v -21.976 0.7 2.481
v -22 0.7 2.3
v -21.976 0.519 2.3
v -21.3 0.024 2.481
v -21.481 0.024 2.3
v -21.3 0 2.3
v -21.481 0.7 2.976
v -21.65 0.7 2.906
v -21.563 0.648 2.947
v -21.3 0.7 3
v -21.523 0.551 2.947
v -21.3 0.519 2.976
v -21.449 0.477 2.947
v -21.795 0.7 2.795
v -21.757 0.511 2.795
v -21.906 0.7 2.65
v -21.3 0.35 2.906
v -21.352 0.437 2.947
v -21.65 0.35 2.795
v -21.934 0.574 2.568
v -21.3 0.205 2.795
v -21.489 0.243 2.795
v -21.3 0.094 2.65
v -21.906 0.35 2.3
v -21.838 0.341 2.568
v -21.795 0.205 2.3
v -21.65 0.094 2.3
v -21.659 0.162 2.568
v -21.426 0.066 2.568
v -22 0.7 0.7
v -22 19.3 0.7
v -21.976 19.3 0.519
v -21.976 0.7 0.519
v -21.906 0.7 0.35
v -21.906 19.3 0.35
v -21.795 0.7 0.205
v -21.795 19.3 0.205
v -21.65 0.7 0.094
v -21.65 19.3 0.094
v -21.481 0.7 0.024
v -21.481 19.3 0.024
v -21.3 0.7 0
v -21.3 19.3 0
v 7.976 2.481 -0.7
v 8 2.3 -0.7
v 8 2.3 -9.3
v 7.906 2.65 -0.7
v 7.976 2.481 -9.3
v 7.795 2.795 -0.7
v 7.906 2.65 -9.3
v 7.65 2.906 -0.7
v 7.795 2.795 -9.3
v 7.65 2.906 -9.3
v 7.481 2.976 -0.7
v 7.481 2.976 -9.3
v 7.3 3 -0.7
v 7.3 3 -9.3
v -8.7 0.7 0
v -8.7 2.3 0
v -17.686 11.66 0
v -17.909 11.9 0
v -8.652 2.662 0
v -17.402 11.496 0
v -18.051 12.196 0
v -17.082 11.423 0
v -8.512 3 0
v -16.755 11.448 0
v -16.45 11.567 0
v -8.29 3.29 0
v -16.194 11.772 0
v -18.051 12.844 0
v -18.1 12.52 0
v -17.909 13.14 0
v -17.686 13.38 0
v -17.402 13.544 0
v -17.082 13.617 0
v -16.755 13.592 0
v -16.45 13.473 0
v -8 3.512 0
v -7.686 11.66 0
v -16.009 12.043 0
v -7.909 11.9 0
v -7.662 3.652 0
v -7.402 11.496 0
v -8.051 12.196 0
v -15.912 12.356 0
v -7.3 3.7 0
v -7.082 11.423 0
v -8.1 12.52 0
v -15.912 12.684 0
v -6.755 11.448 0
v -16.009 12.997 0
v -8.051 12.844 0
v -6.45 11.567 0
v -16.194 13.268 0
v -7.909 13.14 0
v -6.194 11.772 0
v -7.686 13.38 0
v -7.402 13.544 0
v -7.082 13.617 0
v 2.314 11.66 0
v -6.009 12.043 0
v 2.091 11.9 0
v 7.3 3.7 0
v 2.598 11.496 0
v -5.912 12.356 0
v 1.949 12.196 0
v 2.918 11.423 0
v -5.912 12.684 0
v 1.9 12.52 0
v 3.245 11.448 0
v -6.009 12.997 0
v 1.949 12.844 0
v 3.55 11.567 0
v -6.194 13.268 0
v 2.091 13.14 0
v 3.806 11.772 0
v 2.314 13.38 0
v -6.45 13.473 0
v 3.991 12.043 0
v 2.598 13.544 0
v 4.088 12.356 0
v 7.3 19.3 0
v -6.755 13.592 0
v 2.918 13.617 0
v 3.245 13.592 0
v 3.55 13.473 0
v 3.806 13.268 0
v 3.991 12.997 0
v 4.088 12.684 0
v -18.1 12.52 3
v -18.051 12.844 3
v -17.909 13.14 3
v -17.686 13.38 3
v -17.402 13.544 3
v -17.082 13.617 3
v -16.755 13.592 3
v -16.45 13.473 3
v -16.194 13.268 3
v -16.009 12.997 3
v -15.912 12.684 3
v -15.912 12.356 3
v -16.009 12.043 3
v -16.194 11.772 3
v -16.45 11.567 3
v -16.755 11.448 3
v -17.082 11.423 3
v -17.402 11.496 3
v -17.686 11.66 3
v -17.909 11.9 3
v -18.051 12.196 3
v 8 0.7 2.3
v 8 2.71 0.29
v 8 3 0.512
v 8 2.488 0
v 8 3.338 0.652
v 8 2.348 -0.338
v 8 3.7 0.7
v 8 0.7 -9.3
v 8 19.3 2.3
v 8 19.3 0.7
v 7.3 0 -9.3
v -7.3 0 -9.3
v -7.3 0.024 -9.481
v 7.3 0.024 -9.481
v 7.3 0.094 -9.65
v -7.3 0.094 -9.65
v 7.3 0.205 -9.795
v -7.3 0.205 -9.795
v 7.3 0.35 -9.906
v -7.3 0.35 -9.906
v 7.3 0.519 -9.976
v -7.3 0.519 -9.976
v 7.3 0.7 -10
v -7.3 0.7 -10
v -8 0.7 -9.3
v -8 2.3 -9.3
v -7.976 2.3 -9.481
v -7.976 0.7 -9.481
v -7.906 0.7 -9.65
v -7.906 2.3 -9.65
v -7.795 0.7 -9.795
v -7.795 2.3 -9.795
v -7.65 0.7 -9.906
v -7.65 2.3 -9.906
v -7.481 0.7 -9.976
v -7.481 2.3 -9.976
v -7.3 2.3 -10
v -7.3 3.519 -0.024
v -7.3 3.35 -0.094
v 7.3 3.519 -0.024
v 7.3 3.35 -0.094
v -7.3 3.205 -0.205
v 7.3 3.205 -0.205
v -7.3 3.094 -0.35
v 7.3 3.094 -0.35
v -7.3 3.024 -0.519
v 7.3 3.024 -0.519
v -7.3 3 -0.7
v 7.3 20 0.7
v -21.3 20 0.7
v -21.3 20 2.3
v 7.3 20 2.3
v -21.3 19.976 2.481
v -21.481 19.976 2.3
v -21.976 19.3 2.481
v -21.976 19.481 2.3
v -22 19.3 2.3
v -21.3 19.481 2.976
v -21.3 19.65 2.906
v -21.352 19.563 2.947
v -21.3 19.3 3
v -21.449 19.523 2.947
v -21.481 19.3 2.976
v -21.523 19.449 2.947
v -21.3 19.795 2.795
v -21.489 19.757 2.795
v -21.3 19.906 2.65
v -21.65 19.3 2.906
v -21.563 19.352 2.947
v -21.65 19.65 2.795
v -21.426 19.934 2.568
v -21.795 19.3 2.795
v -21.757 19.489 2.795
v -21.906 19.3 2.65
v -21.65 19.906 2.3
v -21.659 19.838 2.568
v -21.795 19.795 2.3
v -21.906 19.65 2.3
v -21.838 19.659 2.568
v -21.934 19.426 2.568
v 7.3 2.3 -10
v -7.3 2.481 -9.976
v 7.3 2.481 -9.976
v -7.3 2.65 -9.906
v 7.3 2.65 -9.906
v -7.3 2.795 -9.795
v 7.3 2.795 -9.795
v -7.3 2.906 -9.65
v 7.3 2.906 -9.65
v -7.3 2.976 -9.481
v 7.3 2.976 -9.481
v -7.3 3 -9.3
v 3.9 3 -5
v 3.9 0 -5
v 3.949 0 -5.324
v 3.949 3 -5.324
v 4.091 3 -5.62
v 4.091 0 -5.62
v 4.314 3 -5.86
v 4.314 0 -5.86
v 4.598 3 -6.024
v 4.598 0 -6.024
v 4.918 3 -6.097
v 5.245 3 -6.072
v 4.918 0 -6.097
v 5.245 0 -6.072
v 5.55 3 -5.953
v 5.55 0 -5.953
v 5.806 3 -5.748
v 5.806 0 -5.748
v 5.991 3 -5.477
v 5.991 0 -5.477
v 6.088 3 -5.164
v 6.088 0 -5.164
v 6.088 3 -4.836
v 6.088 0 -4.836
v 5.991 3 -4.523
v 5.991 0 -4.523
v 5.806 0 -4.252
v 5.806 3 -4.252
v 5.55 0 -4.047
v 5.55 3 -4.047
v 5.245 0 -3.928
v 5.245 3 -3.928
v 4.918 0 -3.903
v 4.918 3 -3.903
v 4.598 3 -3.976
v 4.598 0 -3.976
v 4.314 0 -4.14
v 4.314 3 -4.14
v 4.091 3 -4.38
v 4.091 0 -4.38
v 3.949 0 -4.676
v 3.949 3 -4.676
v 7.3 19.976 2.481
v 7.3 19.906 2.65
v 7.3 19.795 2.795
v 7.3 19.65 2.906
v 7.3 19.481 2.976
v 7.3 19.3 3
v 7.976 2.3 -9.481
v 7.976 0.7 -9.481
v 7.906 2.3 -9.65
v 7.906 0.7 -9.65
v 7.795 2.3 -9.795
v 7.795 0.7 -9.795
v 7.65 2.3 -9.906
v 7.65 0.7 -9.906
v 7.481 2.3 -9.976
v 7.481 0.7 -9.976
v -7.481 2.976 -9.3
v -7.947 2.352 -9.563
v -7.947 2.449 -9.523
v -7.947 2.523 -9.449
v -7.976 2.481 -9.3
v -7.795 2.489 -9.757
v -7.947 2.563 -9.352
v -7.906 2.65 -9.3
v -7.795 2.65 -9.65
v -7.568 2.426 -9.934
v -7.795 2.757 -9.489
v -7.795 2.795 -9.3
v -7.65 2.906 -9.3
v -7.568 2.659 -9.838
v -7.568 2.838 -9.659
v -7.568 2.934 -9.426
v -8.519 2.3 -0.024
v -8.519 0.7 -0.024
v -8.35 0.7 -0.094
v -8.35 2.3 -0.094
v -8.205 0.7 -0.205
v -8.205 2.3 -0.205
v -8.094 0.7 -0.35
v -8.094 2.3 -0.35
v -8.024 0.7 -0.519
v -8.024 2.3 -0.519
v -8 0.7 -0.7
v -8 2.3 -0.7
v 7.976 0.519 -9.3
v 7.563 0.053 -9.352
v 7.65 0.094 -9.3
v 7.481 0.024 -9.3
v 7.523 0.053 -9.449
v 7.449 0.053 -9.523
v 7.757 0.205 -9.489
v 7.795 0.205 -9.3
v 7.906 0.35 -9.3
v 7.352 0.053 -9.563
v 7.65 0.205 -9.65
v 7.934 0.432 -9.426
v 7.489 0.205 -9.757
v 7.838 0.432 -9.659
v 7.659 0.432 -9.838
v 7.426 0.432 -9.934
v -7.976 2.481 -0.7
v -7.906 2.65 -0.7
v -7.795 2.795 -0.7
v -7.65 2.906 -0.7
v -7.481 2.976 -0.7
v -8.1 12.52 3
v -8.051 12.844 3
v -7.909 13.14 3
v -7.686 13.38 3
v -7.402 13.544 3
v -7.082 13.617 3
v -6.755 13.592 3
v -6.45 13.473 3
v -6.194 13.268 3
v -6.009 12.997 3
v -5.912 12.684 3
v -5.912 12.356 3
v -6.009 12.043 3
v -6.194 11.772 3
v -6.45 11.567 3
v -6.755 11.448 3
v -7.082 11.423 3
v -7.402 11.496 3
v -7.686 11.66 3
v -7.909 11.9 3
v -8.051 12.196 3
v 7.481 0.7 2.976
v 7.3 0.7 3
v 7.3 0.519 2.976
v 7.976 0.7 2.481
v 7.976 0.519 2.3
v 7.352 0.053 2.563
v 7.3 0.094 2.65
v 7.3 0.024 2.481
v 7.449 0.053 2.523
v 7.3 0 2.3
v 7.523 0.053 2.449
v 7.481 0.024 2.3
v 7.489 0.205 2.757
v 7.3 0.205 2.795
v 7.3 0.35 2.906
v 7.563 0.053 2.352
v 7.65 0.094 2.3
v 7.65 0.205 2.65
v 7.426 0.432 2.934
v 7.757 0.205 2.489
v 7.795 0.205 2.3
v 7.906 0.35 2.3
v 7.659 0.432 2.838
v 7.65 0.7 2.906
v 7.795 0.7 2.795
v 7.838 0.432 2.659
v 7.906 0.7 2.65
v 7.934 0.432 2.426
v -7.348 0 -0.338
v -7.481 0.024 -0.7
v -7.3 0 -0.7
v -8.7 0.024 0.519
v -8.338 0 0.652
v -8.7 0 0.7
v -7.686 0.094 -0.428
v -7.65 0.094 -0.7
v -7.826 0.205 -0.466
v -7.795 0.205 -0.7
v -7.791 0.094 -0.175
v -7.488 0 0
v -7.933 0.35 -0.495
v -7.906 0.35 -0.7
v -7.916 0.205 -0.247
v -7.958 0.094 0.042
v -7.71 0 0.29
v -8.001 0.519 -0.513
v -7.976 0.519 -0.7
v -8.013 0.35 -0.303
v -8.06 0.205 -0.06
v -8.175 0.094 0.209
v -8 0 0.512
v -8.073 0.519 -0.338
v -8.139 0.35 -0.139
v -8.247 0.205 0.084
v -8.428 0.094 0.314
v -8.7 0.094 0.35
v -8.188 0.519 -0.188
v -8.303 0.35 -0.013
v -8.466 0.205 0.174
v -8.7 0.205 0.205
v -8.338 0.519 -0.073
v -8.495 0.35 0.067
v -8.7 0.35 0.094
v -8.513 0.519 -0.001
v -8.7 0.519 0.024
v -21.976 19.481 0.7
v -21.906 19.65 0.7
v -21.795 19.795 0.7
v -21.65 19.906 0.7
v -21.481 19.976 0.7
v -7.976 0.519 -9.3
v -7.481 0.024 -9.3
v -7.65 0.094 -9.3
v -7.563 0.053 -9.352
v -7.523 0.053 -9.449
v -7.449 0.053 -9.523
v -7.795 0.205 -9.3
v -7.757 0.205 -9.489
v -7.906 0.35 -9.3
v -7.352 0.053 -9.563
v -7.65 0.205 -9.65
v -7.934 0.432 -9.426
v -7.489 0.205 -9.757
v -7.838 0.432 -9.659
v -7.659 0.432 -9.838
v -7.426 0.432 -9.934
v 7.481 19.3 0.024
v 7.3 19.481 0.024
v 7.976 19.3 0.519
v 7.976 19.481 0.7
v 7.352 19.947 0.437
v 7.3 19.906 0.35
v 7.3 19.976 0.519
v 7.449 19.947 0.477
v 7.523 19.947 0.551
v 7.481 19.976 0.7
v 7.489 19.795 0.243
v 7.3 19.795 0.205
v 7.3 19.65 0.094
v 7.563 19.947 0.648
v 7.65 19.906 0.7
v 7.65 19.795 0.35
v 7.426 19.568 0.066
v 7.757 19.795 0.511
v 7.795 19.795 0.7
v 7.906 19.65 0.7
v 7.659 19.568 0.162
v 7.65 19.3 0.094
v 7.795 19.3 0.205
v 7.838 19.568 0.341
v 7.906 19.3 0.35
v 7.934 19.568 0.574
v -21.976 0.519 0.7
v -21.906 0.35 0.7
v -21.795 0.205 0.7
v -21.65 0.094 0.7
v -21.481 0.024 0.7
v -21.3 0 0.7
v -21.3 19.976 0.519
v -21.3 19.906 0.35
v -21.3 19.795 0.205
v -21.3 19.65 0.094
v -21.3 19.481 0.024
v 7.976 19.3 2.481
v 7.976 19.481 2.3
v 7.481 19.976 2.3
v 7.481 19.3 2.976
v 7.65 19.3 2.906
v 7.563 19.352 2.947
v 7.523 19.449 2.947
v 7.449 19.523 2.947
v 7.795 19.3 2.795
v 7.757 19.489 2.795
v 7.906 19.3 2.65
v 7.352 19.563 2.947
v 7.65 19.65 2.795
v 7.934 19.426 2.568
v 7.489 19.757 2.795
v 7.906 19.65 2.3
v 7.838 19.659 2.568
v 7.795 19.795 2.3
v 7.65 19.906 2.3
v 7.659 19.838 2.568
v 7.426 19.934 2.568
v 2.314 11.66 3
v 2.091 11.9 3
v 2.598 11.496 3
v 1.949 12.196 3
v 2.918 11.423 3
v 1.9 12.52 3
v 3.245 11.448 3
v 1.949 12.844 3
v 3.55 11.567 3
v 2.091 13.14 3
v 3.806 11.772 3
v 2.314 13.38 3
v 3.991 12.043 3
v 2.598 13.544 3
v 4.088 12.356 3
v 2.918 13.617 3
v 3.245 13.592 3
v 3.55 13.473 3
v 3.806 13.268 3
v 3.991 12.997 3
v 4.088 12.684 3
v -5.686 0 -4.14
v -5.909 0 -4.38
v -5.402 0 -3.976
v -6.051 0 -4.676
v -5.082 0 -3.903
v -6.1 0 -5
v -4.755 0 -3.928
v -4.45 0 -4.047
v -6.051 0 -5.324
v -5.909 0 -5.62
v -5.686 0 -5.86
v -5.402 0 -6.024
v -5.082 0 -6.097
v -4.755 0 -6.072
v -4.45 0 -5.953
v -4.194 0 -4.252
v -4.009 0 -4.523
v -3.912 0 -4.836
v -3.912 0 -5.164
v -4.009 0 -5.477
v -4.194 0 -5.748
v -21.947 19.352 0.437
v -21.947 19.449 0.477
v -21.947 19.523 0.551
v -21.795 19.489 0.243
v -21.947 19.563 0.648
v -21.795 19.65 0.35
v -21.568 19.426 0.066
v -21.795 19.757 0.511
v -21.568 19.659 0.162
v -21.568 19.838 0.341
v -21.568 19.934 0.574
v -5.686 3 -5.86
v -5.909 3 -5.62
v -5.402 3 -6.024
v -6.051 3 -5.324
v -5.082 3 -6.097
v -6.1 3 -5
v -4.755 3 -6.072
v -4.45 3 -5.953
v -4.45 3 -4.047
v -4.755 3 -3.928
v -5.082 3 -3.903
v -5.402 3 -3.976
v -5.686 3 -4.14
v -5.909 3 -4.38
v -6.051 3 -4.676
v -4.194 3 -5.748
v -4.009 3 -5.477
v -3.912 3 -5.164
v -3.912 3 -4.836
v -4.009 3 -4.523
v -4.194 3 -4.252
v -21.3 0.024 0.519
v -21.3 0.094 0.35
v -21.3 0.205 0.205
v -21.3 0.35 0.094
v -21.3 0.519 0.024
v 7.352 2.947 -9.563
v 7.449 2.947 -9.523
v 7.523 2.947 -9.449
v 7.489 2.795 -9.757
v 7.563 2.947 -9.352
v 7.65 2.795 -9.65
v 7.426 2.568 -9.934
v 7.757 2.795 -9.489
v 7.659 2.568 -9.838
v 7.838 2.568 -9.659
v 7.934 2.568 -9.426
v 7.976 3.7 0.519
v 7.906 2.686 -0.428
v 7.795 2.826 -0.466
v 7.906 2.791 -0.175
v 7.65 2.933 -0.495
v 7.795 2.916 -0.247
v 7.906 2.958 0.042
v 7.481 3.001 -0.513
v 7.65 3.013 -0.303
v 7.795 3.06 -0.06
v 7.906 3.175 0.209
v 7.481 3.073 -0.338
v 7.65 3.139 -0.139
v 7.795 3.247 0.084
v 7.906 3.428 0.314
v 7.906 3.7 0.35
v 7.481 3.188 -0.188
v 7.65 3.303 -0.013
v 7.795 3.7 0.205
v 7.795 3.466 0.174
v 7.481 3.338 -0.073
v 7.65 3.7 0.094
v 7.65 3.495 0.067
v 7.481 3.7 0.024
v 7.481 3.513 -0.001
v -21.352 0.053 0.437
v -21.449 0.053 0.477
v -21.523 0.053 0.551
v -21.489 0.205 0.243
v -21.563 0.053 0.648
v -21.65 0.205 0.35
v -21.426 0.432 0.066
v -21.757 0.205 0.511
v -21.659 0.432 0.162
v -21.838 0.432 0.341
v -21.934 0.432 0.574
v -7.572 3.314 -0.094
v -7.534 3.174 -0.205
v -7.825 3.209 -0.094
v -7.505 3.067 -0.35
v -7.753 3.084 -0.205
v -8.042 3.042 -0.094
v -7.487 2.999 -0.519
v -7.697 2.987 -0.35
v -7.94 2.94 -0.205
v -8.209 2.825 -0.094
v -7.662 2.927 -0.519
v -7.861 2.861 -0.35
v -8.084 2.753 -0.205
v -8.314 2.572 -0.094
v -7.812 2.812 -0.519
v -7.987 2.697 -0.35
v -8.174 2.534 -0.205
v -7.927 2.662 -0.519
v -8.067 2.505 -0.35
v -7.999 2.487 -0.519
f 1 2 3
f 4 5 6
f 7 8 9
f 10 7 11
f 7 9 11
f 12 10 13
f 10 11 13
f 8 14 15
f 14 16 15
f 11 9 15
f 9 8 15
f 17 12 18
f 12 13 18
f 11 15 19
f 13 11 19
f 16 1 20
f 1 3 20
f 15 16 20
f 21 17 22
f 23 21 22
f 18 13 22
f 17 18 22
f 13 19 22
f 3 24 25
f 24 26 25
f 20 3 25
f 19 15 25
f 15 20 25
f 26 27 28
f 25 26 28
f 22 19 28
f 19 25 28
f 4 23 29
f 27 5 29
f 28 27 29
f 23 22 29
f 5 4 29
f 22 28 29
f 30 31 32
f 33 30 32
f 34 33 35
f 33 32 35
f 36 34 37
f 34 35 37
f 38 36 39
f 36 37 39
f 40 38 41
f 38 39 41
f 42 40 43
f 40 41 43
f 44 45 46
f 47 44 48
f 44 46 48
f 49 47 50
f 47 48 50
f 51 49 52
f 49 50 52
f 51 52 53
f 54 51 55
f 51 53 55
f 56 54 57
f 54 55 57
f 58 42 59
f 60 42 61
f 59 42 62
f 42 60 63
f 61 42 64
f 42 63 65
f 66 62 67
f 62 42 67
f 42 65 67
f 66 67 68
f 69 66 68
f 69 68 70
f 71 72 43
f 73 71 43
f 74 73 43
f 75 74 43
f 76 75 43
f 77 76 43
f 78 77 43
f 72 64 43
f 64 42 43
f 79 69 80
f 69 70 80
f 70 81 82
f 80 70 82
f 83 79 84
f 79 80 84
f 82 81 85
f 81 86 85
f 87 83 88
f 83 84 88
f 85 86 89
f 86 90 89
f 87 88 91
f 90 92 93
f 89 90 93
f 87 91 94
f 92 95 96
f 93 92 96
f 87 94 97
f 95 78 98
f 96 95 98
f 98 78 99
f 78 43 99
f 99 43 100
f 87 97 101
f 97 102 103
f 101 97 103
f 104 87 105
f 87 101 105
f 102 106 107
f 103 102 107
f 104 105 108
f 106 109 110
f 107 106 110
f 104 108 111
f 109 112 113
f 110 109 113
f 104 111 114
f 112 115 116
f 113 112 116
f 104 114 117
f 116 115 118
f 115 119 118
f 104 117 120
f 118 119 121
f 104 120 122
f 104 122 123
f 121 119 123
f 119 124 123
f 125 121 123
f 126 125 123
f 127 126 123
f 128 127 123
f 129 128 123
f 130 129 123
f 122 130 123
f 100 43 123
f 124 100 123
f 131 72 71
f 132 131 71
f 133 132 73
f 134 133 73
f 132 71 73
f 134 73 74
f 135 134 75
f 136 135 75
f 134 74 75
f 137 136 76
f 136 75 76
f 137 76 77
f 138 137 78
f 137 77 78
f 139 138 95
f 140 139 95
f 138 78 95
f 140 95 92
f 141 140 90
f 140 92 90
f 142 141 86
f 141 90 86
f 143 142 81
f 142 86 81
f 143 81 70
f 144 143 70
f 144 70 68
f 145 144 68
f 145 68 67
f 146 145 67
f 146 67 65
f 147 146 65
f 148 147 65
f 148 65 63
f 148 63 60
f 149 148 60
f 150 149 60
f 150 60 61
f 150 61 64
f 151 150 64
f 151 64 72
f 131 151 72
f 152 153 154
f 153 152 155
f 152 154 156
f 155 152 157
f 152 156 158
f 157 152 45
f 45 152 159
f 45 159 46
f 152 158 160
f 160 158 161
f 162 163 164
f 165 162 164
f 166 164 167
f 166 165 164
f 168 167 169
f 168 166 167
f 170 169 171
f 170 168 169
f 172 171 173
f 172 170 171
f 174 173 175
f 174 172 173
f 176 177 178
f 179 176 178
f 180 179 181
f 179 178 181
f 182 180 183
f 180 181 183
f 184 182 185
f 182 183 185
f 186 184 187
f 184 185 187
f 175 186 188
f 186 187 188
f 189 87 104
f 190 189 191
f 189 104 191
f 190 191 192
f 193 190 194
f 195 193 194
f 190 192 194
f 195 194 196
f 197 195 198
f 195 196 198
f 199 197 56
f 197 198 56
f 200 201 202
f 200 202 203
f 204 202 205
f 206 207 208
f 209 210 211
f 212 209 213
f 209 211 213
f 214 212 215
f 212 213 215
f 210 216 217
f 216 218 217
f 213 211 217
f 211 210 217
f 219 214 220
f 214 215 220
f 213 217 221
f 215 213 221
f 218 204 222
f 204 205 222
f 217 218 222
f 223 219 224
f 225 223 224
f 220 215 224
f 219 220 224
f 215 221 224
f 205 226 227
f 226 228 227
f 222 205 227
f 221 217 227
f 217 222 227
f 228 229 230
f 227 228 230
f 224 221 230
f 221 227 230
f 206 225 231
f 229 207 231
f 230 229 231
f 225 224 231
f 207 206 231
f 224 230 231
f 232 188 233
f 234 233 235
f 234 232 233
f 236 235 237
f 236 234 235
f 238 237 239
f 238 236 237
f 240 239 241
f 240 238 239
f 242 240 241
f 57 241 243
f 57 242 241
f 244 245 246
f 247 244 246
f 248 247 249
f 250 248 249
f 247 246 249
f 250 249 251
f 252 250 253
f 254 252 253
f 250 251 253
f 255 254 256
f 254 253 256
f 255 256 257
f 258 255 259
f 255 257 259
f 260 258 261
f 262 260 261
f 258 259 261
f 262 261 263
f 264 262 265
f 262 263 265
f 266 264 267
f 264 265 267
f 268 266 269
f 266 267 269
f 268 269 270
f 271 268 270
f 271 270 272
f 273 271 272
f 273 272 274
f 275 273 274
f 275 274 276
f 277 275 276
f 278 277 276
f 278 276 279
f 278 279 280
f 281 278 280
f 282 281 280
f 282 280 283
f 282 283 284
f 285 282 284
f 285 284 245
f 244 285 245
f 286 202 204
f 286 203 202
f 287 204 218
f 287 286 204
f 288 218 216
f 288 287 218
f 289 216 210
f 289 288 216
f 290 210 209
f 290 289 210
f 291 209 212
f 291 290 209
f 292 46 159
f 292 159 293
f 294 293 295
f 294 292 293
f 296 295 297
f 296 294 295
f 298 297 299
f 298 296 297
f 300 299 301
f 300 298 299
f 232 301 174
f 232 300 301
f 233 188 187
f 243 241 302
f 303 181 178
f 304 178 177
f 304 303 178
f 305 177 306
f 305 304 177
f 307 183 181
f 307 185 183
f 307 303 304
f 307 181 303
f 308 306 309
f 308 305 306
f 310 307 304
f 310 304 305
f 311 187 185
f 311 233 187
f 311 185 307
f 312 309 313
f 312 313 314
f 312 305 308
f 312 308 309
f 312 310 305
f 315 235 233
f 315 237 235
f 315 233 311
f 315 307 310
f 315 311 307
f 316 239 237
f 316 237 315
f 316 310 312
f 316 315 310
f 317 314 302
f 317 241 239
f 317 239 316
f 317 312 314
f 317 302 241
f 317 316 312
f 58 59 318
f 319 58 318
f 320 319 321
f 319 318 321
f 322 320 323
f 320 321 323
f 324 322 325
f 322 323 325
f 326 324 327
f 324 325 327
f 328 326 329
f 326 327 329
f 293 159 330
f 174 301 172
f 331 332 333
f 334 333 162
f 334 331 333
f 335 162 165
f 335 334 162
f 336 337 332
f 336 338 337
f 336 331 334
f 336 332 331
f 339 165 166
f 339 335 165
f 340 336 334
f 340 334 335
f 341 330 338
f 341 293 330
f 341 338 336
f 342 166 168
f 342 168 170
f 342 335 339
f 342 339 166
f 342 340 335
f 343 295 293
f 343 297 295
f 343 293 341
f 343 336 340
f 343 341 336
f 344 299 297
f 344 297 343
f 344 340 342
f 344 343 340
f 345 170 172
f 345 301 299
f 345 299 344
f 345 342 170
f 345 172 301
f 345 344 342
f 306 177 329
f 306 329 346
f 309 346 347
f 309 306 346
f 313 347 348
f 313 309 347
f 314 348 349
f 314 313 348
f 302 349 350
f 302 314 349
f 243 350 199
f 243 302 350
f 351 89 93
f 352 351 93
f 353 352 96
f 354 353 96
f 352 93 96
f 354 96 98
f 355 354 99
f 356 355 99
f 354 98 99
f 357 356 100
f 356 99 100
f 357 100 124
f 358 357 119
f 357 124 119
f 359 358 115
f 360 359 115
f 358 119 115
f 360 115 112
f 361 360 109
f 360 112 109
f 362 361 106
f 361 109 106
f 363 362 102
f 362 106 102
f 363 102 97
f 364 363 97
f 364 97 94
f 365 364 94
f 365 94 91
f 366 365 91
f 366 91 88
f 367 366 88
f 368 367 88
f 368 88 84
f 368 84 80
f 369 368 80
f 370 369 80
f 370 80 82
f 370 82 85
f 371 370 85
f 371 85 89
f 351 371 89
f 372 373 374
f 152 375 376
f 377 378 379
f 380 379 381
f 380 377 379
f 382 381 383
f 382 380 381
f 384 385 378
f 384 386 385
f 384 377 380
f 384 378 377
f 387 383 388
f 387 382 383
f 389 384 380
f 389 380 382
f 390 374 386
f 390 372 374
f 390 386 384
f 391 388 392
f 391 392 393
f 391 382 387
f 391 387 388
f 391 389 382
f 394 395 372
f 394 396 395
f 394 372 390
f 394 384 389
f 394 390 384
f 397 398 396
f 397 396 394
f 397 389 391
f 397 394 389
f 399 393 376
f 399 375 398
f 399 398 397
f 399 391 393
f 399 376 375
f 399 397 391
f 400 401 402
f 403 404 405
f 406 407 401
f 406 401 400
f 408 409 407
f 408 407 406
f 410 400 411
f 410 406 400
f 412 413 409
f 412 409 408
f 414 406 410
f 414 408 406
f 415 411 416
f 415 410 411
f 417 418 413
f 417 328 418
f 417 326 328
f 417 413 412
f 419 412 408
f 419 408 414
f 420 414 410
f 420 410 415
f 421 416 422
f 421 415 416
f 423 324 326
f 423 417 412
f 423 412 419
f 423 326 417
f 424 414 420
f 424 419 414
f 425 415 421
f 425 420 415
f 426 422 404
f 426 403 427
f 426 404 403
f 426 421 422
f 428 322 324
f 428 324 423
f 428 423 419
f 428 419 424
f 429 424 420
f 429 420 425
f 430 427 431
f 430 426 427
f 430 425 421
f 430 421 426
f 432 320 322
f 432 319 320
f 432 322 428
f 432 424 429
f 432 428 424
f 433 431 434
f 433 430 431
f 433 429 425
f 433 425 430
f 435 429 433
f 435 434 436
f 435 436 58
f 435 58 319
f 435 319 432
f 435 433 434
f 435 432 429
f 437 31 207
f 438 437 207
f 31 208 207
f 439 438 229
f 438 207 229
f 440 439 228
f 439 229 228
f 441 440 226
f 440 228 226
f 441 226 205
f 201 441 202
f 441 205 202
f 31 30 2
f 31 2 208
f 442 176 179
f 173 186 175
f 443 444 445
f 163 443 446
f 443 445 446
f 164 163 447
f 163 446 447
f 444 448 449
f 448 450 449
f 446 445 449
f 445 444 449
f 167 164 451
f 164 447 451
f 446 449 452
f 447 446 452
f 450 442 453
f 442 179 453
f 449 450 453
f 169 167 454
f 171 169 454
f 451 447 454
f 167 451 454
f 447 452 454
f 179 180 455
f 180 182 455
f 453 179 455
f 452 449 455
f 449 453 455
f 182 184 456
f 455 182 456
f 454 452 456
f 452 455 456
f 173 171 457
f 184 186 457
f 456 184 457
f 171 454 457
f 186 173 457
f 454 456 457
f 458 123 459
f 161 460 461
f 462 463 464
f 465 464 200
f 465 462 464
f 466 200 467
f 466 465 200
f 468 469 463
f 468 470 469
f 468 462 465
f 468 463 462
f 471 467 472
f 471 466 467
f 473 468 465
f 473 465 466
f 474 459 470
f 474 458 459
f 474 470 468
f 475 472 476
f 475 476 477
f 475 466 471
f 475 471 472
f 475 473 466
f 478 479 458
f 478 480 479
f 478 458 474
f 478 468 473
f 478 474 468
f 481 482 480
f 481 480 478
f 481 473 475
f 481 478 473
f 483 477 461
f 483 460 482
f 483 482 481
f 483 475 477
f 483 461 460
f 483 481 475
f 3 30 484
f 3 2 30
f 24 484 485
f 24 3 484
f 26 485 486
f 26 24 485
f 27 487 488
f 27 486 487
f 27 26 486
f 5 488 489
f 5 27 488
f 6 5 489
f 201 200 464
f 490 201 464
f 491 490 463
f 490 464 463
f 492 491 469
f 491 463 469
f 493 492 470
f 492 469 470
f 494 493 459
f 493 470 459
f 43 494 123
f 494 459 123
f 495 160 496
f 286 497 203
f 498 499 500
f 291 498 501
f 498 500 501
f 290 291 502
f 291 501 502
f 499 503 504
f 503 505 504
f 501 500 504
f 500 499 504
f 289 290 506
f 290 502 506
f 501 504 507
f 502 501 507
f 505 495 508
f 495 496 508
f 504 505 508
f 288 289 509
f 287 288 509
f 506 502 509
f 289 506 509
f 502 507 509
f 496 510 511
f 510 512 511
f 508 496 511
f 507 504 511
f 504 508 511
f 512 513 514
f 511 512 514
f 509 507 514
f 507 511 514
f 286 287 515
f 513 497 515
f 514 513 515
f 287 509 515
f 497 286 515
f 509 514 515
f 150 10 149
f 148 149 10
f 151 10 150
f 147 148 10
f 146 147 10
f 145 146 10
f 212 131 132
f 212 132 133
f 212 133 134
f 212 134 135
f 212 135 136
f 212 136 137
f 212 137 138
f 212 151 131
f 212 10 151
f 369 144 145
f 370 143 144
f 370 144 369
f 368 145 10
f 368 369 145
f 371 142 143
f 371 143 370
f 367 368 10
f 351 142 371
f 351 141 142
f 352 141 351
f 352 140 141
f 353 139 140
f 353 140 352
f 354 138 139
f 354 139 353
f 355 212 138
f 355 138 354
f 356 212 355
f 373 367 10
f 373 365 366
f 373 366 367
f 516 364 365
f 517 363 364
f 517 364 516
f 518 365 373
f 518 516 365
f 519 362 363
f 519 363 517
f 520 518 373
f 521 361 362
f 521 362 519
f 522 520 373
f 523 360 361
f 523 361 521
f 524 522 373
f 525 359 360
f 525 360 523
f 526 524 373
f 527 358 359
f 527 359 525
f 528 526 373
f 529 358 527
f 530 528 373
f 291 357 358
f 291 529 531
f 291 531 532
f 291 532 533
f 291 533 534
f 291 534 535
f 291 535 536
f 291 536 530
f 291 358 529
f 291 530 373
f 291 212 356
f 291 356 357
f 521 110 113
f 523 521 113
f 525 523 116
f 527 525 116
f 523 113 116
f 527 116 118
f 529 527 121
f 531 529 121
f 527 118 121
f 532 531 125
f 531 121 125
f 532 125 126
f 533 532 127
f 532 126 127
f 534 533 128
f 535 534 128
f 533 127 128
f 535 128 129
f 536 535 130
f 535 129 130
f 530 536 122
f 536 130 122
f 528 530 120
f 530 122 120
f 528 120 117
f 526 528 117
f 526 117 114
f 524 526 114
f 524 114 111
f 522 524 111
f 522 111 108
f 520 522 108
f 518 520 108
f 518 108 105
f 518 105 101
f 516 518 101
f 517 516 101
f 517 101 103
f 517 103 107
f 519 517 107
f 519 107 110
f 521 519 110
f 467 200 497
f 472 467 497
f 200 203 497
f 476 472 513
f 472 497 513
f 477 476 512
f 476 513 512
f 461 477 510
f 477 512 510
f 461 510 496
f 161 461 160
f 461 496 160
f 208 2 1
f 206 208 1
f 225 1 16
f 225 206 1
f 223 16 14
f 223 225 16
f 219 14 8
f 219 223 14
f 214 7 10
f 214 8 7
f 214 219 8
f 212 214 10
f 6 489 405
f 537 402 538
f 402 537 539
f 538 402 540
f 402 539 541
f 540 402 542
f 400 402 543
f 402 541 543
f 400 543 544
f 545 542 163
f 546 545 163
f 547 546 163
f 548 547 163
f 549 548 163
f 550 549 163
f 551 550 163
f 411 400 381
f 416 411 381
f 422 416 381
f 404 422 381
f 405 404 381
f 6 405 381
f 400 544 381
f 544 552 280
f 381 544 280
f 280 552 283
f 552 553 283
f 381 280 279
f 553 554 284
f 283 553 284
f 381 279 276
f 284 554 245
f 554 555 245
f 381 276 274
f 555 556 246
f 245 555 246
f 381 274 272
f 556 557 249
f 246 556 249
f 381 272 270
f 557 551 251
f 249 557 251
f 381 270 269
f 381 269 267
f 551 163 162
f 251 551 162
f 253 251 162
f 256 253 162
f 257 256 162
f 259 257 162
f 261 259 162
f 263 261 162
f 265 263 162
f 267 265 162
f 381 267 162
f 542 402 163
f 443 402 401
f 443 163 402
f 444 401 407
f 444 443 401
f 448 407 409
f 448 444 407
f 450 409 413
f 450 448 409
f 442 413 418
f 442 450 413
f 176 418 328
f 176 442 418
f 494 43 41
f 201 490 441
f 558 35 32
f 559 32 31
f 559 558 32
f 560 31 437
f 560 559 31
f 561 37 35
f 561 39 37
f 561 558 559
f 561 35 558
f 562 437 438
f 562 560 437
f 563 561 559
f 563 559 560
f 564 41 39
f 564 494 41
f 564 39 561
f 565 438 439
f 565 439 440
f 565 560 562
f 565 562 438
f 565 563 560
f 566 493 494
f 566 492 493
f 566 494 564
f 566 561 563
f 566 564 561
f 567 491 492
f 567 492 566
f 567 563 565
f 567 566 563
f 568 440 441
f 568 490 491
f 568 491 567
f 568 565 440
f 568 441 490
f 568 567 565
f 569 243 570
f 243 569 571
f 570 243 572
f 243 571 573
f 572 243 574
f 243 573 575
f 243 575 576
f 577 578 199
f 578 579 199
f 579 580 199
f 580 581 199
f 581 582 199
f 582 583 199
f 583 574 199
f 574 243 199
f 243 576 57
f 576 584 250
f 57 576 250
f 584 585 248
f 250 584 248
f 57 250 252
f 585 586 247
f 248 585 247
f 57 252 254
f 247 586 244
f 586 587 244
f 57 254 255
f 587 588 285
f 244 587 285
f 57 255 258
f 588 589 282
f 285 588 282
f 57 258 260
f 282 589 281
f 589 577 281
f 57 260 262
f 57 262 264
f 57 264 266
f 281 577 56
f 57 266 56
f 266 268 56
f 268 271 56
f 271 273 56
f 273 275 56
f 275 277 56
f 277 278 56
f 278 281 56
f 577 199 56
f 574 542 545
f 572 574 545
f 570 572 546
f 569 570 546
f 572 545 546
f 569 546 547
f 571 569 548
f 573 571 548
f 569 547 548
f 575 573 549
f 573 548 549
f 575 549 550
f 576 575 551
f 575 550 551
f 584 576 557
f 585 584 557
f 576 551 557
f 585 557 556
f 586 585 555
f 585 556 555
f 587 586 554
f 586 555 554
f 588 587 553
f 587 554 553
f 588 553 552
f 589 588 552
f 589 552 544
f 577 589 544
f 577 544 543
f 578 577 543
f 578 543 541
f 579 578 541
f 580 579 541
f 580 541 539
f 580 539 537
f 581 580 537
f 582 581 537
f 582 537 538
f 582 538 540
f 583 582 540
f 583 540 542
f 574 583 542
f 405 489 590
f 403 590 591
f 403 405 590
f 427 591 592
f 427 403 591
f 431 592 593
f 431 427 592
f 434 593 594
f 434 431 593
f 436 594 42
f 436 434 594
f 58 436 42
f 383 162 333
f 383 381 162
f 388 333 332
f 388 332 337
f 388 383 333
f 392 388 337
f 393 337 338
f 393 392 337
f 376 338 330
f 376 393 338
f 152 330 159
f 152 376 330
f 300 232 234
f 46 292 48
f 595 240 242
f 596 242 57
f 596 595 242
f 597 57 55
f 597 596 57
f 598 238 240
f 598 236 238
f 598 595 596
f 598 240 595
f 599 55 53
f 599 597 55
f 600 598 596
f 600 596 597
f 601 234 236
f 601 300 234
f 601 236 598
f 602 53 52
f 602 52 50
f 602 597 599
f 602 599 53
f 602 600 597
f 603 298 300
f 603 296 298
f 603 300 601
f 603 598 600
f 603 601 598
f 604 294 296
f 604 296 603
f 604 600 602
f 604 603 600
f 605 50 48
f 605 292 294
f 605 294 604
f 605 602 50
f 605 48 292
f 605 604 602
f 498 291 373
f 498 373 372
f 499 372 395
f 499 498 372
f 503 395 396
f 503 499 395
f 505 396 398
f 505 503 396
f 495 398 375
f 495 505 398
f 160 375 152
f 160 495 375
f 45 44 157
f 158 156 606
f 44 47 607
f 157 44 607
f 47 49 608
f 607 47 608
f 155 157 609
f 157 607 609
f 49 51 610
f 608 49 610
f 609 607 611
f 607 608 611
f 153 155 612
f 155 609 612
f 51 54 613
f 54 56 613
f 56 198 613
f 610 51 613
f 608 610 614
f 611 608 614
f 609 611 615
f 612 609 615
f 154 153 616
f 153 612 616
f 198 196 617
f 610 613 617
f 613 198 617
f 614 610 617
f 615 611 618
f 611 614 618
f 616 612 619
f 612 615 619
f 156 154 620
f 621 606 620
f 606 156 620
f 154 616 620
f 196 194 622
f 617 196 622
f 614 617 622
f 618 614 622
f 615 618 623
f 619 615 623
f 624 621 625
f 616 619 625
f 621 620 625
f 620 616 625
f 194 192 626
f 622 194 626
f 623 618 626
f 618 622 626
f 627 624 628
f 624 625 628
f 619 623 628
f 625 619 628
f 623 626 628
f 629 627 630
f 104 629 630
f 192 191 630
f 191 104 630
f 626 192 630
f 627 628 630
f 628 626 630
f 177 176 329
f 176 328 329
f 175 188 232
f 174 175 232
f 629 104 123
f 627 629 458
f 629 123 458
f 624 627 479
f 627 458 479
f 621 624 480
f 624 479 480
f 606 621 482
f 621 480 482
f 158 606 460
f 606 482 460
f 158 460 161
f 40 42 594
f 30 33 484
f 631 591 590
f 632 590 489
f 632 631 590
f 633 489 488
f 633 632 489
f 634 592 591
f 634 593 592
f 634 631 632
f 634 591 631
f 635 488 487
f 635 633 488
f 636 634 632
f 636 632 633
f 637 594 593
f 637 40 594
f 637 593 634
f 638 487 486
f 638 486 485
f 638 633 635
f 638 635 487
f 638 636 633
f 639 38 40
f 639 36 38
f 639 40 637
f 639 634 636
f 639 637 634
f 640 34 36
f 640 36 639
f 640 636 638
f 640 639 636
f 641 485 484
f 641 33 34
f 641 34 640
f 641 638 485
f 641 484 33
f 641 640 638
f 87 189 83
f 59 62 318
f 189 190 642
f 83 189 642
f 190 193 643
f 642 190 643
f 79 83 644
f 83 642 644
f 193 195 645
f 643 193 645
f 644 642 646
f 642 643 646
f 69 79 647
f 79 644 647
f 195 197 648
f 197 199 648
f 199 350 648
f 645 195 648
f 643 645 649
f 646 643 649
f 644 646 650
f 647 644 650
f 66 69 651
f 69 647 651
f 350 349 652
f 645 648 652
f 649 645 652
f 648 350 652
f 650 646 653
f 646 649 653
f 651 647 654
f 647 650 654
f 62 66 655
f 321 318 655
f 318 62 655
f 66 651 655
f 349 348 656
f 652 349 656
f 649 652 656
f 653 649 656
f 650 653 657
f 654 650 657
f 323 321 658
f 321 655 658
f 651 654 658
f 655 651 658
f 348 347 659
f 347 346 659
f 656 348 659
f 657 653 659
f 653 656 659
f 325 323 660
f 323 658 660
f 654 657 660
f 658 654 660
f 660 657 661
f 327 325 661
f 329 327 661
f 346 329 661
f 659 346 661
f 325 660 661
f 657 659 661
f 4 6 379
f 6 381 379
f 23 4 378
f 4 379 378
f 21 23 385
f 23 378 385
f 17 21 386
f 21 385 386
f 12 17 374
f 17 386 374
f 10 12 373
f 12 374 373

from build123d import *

# Parameters (mm, degrees)
SKETCH_1_W              = 16
SKETCH_1_H              = 3
EXTRUDE_1_DEPTH         = 10
SKETCH_2_W              = 30
SKETCH_2_H              = 20
EXTRUDE_2_DEPTH         = 3
HOLE_WIZARD_2_2_2_2_1_D = 2.2
HOLE_WIZARD_2_2_2_2_2_D = 2.2
FILLET_1_R              = 0.7


with BuildPart() as part:
    # 草图1 → 凸台-拉伸1 (new body)
    with BuildSketch(Plane.XY):
        with Locations((0, 1.5)):
            Rectangle(SKETCH_1_W, SKETCH_1_H)
    extrude(amount=-EXTRUDE_1_DEPTH)

    # 草图2 → 凸台-拉伸2 (add)
    with BuildSketch(Plane.XY):
        with Locations((-7, 10)):
            Rectangle(SKETCH_2_W, SKETCH_2_H)
    extrude(amount=EXTRUDE_2_DEPTH)

    # Ø2.2 (2.2) 直径孔1 (through all)
    with Locations(Plane(origin=(0, 3, 0), x_dir=(1, 0, 0), z_dir=(0, 1, 0))):
        with Locations((-5, 5), (5, 5)):
            Hole(HOLE_WIZARD_2_2_2_2_1_D / 2)

    # Ø2.2 (2.2) 直径孔2 (through all)
    with Locations(Plane.XY.offset(3)):
        with Locations((-17, 12.52), (-7, 12.52), (3, 12.52)):
            Hole(HOLE_WIZARD_2_2_2_2_2_D / 2)

    # 圆角1
    fillet_1_edges = [part.edges().sort_by_distance(p)[0] for p in [
        (8, 1.5, -10),
        (8, 11.5, 0),
        (-7, 20, 0),
        (8, 20, 1.5),
        (-22, 10, 0),
        (-22, 20, 1.5),
        (-15, 0, 0),
        (-22, 0, 1.5),
        (8, 10, 3),
        (-7, 20, 3),
        (0, 3, -10),
        (-22, 10, 3),
        (-7, 0, 3),
        (-8, 1.5, -10),
        (0, 3, 0),
        (-8, 1.5, 0),
        (-8, 3, -5),
        (8, 3, -5),
        (8, 0, -3.5),
        (-8, 0, -5),
        (0, 0, -10),
    ]]
    fillet(fillet_1_edges, radius=FILLET_1_R)


solid = part.part
